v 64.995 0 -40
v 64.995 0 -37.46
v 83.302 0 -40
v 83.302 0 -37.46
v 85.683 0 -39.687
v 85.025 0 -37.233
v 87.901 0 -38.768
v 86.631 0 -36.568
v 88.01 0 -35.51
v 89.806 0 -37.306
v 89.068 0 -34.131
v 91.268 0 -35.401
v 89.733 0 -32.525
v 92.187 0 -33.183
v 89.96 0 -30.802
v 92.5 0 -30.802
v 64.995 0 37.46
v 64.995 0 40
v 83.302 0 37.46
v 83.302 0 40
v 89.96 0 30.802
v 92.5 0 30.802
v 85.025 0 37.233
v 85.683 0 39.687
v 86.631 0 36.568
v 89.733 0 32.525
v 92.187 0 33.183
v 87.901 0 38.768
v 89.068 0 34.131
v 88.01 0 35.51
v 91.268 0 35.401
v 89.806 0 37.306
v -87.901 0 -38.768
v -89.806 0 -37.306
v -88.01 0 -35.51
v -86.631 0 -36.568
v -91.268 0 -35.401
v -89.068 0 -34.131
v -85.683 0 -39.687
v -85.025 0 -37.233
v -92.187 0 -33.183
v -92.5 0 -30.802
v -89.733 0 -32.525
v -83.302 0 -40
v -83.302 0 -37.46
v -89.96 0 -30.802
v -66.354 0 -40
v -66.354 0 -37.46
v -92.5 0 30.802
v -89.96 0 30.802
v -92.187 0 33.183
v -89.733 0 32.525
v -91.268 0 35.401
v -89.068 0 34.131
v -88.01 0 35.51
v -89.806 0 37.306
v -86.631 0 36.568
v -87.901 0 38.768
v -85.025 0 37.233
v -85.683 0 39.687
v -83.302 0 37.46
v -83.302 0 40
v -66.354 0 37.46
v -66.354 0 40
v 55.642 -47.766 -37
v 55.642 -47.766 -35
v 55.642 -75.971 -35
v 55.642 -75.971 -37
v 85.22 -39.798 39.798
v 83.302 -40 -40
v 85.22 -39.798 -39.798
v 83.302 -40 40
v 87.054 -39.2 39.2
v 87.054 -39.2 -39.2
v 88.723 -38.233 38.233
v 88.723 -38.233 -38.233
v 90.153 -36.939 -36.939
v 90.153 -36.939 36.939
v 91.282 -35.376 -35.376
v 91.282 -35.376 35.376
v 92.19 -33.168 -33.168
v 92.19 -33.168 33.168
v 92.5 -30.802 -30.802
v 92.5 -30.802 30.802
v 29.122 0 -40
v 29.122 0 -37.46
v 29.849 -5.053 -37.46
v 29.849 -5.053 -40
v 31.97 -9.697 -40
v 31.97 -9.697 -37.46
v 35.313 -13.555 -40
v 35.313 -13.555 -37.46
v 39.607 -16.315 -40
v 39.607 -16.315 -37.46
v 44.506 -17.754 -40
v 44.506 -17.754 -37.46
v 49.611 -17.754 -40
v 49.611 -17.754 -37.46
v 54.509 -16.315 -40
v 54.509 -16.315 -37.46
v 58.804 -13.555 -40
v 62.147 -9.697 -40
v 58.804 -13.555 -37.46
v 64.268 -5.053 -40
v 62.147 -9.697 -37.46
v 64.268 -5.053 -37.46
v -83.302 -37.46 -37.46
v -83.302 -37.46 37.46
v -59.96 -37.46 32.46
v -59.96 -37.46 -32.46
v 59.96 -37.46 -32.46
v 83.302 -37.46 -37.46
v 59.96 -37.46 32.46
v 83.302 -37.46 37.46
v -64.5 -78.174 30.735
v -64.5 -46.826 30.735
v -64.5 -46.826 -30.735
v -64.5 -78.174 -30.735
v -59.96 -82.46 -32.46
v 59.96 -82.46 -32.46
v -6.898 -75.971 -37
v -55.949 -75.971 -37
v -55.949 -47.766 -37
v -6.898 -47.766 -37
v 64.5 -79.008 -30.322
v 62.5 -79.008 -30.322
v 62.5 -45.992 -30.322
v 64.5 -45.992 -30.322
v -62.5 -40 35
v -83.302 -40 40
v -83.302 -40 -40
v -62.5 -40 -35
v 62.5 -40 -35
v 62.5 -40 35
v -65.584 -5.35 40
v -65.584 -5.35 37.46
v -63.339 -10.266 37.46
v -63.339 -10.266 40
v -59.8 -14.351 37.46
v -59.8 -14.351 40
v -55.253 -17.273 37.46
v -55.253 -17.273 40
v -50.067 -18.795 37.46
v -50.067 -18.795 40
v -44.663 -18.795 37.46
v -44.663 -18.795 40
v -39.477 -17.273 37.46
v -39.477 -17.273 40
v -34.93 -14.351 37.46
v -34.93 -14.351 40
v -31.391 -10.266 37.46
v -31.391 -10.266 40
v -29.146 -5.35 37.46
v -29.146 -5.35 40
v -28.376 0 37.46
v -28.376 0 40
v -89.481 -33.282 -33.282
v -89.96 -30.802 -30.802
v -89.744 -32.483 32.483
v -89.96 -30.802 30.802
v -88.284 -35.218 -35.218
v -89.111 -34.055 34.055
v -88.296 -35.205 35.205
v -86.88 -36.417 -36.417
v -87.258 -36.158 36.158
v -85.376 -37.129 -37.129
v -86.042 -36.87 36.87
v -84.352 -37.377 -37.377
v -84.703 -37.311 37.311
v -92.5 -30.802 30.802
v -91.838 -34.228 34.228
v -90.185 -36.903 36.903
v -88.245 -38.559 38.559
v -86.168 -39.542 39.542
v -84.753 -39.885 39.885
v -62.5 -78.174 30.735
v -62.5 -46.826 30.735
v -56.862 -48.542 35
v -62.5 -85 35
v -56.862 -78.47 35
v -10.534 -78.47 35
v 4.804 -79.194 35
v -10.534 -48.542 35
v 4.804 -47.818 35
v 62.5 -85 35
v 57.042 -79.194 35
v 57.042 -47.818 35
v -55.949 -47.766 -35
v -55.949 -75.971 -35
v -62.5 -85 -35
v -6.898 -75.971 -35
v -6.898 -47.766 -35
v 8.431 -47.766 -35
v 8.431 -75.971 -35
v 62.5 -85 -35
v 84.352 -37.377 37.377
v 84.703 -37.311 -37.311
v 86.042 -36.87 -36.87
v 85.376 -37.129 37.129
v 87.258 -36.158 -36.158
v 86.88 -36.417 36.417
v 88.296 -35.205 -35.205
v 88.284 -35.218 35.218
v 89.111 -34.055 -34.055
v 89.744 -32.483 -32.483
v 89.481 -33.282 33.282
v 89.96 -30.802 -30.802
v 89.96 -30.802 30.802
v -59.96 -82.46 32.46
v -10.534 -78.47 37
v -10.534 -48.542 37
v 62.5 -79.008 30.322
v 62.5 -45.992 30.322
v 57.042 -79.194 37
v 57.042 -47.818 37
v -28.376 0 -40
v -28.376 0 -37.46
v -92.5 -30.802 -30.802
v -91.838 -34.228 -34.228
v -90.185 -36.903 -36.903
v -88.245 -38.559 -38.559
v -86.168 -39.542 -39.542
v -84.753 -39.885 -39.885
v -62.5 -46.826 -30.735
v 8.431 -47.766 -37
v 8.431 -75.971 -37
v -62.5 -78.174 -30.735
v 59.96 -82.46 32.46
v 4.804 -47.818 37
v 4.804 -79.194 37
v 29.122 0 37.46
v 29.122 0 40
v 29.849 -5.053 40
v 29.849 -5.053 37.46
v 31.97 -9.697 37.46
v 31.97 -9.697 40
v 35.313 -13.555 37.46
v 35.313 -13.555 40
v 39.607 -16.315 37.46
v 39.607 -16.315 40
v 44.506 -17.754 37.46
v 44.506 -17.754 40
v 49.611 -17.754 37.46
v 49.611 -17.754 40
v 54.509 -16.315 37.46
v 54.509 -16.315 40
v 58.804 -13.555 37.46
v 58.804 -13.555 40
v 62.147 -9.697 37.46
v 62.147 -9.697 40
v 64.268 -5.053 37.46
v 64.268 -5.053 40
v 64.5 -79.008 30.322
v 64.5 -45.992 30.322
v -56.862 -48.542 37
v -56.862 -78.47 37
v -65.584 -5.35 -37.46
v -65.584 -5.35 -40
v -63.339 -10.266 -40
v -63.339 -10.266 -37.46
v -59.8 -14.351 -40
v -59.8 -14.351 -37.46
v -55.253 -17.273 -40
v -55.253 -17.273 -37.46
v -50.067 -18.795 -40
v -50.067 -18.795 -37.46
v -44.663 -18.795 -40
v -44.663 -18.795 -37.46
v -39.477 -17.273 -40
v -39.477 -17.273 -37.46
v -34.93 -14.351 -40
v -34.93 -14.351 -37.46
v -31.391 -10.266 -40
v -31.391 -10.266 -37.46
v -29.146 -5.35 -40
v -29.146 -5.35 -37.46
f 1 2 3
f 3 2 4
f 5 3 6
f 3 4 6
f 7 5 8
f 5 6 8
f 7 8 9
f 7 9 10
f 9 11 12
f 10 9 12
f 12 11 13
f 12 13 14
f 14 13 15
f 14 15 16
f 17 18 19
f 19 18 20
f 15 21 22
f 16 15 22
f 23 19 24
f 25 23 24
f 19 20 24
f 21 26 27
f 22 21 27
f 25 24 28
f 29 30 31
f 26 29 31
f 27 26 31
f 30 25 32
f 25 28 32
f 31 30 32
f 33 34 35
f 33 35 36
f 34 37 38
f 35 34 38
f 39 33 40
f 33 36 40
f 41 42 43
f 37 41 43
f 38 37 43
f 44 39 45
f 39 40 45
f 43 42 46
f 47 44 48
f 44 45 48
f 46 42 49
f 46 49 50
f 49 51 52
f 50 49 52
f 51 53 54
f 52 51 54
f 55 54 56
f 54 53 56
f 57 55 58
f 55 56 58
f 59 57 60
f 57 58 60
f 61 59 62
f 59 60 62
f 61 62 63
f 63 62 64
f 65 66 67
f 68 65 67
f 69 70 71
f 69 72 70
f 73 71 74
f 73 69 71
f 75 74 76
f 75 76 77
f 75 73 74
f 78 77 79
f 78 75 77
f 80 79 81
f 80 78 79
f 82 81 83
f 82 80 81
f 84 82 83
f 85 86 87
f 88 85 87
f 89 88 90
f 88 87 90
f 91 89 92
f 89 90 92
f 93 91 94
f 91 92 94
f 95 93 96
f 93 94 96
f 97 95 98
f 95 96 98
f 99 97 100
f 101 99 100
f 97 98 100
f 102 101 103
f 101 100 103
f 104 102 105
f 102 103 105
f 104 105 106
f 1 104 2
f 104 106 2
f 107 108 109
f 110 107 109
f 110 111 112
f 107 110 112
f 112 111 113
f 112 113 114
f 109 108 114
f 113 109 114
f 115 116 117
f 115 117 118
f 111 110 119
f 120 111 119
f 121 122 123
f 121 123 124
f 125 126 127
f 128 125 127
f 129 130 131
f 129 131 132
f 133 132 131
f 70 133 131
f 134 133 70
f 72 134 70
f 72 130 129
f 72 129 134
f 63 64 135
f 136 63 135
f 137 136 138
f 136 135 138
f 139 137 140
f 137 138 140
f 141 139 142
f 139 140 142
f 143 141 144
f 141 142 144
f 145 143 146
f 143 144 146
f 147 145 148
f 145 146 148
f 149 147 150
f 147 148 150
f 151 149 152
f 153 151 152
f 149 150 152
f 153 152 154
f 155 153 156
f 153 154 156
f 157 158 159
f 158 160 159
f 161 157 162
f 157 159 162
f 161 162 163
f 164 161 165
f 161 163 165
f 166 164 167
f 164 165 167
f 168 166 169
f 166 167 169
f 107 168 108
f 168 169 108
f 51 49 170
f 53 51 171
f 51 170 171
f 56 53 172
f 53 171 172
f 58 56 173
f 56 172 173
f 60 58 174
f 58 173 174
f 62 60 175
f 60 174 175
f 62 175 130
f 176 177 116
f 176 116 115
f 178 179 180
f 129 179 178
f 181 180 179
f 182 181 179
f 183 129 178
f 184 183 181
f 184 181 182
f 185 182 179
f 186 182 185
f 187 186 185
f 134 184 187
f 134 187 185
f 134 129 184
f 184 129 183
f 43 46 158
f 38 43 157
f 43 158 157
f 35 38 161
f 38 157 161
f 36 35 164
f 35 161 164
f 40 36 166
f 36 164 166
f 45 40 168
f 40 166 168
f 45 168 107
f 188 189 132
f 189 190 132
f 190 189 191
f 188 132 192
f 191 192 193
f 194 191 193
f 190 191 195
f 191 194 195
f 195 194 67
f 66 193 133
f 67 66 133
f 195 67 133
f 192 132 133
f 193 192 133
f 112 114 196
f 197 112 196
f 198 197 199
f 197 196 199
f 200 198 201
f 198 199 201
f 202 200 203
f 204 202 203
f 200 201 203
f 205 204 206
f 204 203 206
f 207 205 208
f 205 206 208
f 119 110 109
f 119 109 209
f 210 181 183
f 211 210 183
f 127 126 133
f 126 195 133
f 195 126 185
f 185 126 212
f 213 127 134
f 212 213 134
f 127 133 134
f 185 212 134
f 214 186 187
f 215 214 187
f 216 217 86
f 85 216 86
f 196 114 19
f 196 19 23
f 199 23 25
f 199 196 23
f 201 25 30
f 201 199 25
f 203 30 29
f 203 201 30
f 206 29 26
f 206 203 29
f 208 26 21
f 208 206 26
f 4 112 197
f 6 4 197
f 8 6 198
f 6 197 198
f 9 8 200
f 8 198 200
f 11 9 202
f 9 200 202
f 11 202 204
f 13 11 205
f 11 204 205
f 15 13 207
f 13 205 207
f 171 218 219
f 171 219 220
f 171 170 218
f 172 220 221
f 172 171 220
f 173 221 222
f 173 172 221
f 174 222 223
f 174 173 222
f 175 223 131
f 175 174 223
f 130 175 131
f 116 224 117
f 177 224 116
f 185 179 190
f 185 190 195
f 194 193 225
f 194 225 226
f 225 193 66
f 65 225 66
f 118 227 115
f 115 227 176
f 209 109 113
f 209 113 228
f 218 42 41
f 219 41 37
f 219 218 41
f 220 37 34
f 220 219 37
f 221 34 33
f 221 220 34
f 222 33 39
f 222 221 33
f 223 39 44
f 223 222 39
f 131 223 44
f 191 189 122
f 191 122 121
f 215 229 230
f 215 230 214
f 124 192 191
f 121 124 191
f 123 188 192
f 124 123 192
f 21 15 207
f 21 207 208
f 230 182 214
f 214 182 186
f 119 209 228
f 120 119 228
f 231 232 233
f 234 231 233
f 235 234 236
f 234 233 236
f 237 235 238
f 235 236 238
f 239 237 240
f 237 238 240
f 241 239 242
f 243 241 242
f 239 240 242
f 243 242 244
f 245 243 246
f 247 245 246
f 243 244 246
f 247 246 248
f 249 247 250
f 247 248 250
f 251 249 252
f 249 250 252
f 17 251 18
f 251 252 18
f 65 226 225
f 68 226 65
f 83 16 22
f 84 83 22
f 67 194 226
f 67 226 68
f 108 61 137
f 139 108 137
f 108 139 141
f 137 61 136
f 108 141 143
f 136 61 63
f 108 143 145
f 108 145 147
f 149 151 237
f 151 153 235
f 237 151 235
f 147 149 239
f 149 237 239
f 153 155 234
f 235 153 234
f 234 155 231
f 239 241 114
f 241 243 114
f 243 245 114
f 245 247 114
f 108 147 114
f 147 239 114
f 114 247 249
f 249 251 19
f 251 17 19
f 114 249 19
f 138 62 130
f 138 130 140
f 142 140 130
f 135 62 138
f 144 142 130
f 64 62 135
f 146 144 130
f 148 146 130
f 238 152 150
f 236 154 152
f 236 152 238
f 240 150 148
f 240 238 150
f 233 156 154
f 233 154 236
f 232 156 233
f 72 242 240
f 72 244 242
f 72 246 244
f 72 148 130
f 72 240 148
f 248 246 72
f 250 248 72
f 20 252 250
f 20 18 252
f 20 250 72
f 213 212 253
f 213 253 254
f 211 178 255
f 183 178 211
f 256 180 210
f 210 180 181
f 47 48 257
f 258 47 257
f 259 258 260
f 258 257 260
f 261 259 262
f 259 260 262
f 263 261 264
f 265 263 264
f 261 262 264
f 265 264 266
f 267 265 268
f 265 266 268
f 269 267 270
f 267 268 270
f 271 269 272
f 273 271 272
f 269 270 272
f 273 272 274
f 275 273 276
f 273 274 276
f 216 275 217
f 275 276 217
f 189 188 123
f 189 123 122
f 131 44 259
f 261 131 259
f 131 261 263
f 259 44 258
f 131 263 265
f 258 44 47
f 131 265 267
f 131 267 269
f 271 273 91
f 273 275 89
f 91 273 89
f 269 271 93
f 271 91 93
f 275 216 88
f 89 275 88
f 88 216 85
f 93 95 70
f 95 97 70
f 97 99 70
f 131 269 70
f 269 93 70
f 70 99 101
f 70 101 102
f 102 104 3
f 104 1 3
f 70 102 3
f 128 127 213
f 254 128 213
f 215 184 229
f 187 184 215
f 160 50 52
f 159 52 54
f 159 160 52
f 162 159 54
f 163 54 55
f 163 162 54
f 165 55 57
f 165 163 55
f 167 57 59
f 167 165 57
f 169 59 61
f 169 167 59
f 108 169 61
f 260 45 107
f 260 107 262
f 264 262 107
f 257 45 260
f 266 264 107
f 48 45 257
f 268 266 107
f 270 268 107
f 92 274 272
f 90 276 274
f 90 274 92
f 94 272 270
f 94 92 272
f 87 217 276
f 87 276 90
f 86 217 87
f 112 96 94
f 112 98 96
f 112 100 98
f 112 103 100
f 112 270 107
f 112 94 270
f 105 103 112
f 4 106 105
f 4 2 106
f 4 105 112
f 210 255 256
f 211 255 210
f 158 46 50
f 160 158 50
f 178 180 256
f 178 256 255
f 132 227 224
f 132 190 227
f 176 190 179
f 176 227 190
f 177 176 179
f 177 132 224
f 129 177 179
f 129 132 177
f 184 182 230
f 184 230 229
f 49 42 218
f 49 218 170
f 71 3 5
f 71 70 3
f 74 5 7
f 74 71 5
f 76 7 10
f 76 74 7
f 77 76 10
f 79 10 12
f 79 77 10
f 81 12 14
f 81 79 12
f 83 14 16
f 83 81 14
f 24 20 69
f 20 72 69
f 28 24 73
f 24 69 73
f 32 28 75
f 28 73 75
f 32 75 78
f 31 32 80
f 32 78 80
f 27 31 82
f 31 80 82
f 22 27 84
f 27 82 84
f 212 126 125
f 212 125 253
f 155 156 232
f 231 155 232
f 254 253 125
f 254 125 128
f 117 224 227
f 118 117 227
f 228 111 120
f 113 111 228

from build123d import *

# Parameters (mm, degrees)
F0_W        = 185
F0_H        = 80
F1_DEPTH    = 40
F2_W        = 125
F2_H        = 70
F3_DEPTH    = 45
F4_R        = 9.1981536726
F5_T        = 2.54
F5_T3_DEPTH = 130.08
F5_T5_DEPTH = 75.08
F7_DEPTH    = 112.6
F8_W        = 49.0510910749
F8_H        = 28.2043814659
F8_W_2      = 47.2116749734
F9_DEPTH    = 2
F10_W       = 52.2382371128
F10_H       = 31.3754677773
F10_W_2     = 46.3282726705
F10_H_2     = 29.9284607172
F11_DEPTH   = 2
F12_W       = 31.3480645418
F12_H       = 61.4709071815
F13_DEPTH   = 2
F14_W       = 33.0155193806
F14_H       = 60.6432519853
F15_DEPTH   = 2


# Not quite as in the source:
# - a shell that OpenCascade refuses in one call is made with other operations: the cavity is built on its own and cut out


with BuildPart() as f1:
    # F0 (on Front) → F1 (new body)
    with BuildSketch(Plane.XZ):
        Rectangle(F0_W, F0_H)
    extrude(amount=F1_DEPTH)

    # F2 (on face) → F3 (join)
    with BuildSketch(Plane.XZ.offset(40)):
        Rectangle(F2_W, F2_H)
    extrude(amount=F3_DEPTH)

    # F4
    f4_edges = [f1.edges().sort_by_distance(p)[0] for p in [
        (-92.5, -40, 0),
        (92.5, -40, 0),
        (92.5, -20, 40),
        (92.5, -20, -40),
        (-92.5, -20, -40),
        (-92.5, -20, 40),
    ]]
    fillet(f4_edges, radius=F4_R)

    # F5: shell of thickness 2.54, made by hand


with BuildPart() as f5_core1:
    # F5_t2: copy of F1
    add(f1.part)

    # the walls: a layer under each face that stays
    f5_faces = [f5_core1.faces().sort_by_distance(p)[0] for p in [
        (0, -20, 40),
        (89.8059231637, -20, 37.3059231637),
        (-89.8059231637, -20, 37.3059231637),
        (-71.4015825663, -40, -34.2857142857),
        (92.5, -15.4009231637, 0),
        (-92.5, -15.4009231637, 0),
        (89.8059231637, -20, -37.3059231637),
        (-89.8059231637, -20, -37.3059231637),
        (0, -20, -40),
        (89.8059231637, -37.3059231637, 0),
        (-89.8059231637, -37.3059231637, 0),
        (0, -62.5, 35),
        (-62.5, -62.5, 0),
        (0, -62.5, -35),
        (62.5, -62.5, 0),
        (0, -85, 0),
    ]]
    thicken(f5_faces, amount=-F5_T, mode=Mode.SUBTRACT)

    # F5_s4 → F5_t3 (cut)
    with BuildSketch(Plane.YZ.offset(-65.04)):
        Polygon((-40.0254, 35.0254), (-37.46, 35), (-37.46, 32.46), (-40, 32.46), align=None)
        Polygon((-40.0254, -35.0254), (-37.46, -35), (-37.46, -32.46), (-40, -32.46), align=None)
    extrude(amount=F5_T3_DEPTH, mode=Mode.SUBTRACT)

    # F5_s6 → F5_t5 (cut)
    with BuildSketch(Plane.XY.offset(-37.54)):
        Polygon((-62.5254, -40.0254), (-62.5, -37.46), (-59.96, -37.46), (-59.96, -40), align=None)
        Polygon((62.5254, -40.0254), (62.5, -37.46), (59.96, -37.46), (59.96, -40), align=None)
    extrude(amount=F5_T5_DEPTH, mode=Mode.SUBTRACT)


with BuildPart() as f1_1:
    add(f1.part)

    # what is left inside the walls is the cavity
    f5_cavity = [f5_core1.part.solids().sort_by_distance(p)[0] for p in [
        (0, -0.0254, -12.486667),
    ]]
    add(f5_cavity, mode=Mode.SUBTRACT)

    # F6 (on face) → F7 (cut)
    with BuildSketch(Plane.XY.offset(40)):
        with BuildLine():
            ThreePointArc((-66.3535060933, 0), (-47.3649650812, -18.9885410121), (-28.3764240691, 0))
            Line((-28.3764240691, 0), (-66.3535060933, 0))
        make_face()
        with BuildLine():
            Line((64.9945122235, 0), (29.1222798593, 0))
            ThreePointArc((29.1222798593, 0), (47.0583960414, -17.9361161821), (64.9945122235, 0))
        make_face()
    extrude(amount=-F7_DEPTH, mode=Mode.SUBTRACT)

    # F8 (on face) → F9 (join)
    with BuildSketch(Plane(origin=(0, 0, -35), x_dir=(1, 0, 0), z_dir=(0, 0, -1))):
        with Locations((-31.4233601093, 61.8686154485)):
            Rectangle(F8_W, F8_H)
        with Locations((32.0364944637, 61.8686154485)):
            Rectangle(F8_W_2, F8_H)
    extrude(amount=F9_DEPTH)

    # F10 (on face) → F11 (join)
    with BuildSketch(Plane.XY.offset(35)):
        with Locations((30.9228170663, -63.50582093)):
            Rectangle(F10_W, F10_H)
        with Locations((-33.6980968714, -63.50582093)):
            Rectangle(F10_W_2, F10_H_2)
    extrude(amount=F11_DEPTH)

    # F12 (on face) → F13 (join)
    with BuildSketch(Plane(origin=(-62.5, 0, 0), x_dir=(0, -1, 0), z_dir=(-1, 0, 0))):
        with Locations((62.5, 0)):
            Rectangle(F12_W, F12_H)
    extrude(amount=F13_DEPTH)

    # F14 (on face) → F15 (join)
    with BuildSketch(Plane.YZ.offset(62.5)):
        with Locations((-62.5, 0)):
            Rectangle(F14_W, F14_H)
    extrude(amount=F15_DEPTH)


solid = f1_1.part
